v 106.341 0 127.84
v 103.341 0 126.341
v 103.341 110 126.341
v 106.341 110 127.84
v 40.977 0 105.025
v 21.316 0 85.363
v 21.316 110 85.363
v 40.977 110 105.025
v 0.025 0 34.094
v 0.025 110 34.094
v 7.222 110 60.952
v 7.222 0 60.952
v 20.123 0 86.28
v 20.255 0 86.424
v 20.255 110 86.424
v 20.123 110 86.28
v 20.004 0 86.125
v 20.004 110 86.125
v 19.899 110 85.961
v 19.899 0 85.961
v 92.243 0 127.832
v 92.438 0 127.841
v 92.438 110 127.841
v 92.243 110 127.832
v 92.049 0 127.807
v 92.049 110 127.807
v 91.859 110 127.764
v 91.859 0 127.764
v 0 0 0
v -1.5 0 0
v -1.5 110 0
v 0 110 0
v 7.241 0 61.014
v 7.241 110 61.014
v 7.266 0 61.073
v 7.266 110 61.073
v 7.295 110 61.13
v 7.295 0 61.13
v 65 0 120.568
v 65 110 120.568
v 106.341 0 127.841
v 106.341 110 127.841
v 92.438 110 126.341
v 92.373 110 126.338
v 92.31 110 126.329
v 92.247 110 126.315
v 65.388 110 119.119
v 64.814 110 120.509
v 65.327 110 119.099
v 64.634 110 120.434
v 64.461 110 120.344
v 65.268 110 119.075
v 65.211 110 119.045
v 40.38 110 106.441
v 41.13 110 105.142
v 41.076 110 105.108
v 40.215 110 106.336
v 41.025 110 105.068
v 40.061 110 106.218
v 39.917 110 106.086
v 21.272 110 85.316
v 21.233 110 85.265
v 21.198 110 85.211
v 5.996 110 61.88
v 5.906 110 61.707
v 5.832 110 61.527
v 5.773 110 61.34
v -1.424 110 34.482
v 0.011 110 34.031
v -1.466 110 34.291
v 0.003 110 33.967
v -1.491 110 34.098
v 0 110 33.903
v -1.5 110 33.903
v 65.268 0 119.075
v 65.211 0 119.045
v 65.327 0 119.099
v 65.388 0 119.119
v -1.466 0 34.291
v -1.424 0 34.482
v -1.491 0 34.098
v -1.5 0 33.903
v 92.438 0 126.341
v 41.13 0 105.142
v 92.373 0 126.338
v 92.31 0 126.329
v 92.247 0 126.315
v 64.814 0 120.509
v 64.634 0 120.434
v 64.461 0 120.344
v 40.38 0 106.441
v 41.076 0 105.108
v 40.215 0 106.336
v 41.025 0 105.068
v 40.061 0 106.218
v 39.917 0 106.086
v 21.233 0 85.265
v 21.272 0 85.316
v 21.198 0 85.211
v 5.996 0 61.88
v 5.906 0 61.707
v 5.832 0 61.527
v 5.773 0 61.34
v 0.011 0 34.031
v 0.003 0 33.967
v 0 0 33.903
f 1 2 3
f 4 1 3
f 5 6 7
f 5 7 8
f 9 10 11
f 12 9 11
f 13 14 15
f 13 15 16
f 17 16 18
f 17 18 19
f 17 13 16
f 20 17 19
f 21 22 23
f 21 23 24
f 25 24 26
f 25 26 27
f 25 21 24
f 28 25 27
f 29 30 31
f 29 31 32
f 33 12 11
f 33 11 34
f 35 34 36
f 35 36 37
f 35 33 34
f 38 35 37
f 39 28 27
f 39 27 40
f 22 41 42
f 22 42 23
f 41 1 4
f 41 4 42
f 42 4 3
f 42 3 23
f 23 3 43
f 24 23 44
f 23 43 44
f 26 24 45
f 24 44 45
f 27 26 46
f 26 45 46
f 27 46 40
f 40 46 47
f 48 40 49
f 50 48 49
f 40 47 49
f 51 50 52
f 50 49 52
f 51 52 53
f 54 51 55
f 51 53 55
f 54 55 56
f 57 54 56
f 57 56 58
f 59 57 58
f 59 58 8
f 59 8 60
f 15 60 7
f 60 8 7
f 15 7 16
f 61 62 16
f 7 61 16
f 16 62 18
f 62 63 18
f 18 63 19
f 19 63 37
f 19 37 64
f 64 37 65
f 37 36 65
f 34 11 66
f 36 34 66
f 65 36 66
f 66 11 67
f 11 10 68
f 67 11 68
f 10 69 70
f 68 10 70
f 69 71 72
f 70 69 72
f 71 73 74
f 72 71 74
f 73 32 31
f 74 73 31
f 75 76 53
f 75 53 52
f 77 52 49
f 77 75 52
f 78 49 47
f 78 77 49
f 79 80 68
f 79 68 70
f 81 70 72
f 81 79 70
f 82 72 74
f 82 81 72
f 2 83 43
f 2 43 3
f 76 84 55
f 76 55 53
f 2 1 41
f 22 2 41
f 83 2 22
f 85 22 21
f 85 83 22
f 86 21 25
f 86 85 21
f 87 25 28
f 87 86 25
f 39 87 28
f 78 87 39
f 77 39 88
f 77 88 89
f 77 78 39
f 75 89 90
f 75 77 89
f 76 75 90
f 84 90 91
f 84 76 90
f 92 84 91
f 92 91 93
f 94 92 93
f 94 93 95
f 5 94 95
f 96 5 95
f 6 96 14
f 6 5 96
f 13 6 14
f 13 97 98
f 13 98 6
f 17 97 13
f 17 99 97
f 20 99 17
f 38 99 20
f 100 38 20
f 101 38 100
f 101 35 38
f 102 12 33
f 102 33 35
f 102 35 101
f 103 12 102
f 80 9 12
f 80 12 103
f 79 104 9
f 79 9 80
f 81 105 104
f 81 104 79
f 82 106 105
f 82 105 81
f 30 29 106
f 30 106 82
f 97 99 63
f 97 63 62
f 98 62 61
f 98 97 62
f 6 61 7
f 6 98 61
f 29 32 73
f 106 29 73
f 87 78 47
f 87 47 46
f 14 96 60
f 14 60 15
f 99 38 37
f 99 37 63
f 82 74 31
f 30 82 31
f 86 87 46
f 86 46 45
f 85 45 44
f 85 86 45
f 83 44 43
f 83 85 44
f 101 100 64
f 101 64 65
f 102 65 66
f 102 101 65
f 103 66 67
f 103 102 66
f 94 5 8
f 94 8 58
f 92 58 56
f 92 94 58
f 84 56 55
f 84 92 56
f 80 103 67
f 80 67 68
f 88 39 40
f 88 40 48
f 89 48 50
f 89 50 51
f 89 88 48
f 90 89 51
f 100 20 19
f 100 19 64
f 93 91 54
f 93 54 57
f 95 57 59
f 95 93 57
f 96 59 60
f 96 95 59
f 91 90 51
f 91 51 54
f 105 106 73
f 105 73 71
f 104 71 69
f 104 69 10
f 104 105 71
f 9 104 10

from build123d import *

# Parameters (mm, degrees)
BASE_FLANGE1_DEPTH = 110
CHAMFER1_SIZE2     = 3
CHAMFER1_SIZE      = 1.5


# Sheet-metal steps are written as plain solids
with BuildPart() as part:
    # Sketch1 → Base-Flange1 (new body)
    with BuildSketch(Plane(origin=(0, 0, 0), x_dir=(1, 0, 0), z_dir=(0, 1, 0))):
        with BuildLine():
            Line((0, 0), (0, -20))
            Line((0, -20), (0, -33.90302477))
            ThreePointArc((0, -33.90302477), (0.006301715, -33.999170363), (0.025099036, -34.093670879))
            Line((0.025099036, -34.093670879), (7.221834227, -60.952252257))
            ThreePointArc((7.221834227, -60.952252257), (7.252805527, -61.043490765), (7.295420878, -61.129906149))
            Line((7.295420878, -61.129906149), (21.198445648, -85.21065143))
            ThreePointArc((21.198445648, -85.21065143), (21.25197589, -85.290765098), (21.315505105, -85.363206285))
            Line((21.315505105, -85.363206285), (40.977351294, -105.025052473))
            ThreePointArc((40.977351294, -105.025052473), (41.04979248, -105.088581688), (41.129906149, -105.14211193))
            Line((41.129906149, -105.14211193), (65.21065143, -119.0451367))
            ThreePointArc((65.21065143, -119.0451367), (65.297066813, -119.087752052), (65.388305321, -119.118723352))
            Line((65.388305321, -119.118723352), (92.246886699, -126.315458542))
            ThreePointArc((92.246886699, -126.315458542), (92.341387215, -126.334255863), (92.437532808, -126.340557578))
            Line((92.437532808, -126.340557578), (106.340557578, -126.340557578))
            Line((106.340557578, -126.340557578), (106.340557578, -127.840557578))
            Line((106.340557578, -127.840557578), (92.437532808, -127.840557578))
            ThreePointArc((92.437532808, -127.840557578), (92.145597926, -127.821423155), (91.858658132, -127.764347281))
            Line((91.858658132, -127.764347281), (65.000076753, -120.567612091))
            ThreePointArc((65.000076753, -120.567612091), (64.723041665, -120.47357135), (64.46065143, -120.344174806))
            Line((64.46065143, -120.344174806), (40.379906149, -106.441150036))
            ThreePointArc((40.379906148, -106.441150036), (40.136650336, -106.278611699), (39.916691122, -106.085712644))
            Line((39.916691122, -106.085712645), (20.254844934, -86.423866456))
            ThreePointArc((20.254844934, -86.423866456), (20.06194588, -86.203907242), (19.899407542, -85.96065143))
            Line((19.899407542, -85.96065143), (5.996382772, -61.879906149))
            ThreePointArc((5.996382772, -61.879906149), (5.866986228, -61.617515913), (5.772945487, -61.340480825))
            Line((5.772945487, -61.340480825), (-1.423789703, -34.481899447))
            ThreePointArc((-1.423789703, -34.481899447), (-1.480865577, -34.194959652), (-1.5, -33.90302477))
            Line((-1.5, -33.90302477), (-1.5, -20))
            Line((-1.5, -20), (-1.5, 0))
            Line((-1.5, 0), (0, 0))
        make_face()
    extrude(amount=BASE_FLANGE1_DEPTH)

    # Chamfer1
    chamfer1_edges = [part.edges().sort_by_distance(p)[0] for p in [
        (106.340557578, 55, 126.340557578),
    ]]
    chamfer1_side = [part.faces().sort_by_distance(p)[0] for p in [
        (106.340557578, 55, 126.370557578),
    ]]
    chamfer(chamfer1_edges, length=CHAMFER1_SIZE - 0.0001, length2=CHAMFER1_SIZE2 - 0.0001, reference=chamfer1_side[0])  # a hair under: the kernel refuses the full size


solid = part.part
